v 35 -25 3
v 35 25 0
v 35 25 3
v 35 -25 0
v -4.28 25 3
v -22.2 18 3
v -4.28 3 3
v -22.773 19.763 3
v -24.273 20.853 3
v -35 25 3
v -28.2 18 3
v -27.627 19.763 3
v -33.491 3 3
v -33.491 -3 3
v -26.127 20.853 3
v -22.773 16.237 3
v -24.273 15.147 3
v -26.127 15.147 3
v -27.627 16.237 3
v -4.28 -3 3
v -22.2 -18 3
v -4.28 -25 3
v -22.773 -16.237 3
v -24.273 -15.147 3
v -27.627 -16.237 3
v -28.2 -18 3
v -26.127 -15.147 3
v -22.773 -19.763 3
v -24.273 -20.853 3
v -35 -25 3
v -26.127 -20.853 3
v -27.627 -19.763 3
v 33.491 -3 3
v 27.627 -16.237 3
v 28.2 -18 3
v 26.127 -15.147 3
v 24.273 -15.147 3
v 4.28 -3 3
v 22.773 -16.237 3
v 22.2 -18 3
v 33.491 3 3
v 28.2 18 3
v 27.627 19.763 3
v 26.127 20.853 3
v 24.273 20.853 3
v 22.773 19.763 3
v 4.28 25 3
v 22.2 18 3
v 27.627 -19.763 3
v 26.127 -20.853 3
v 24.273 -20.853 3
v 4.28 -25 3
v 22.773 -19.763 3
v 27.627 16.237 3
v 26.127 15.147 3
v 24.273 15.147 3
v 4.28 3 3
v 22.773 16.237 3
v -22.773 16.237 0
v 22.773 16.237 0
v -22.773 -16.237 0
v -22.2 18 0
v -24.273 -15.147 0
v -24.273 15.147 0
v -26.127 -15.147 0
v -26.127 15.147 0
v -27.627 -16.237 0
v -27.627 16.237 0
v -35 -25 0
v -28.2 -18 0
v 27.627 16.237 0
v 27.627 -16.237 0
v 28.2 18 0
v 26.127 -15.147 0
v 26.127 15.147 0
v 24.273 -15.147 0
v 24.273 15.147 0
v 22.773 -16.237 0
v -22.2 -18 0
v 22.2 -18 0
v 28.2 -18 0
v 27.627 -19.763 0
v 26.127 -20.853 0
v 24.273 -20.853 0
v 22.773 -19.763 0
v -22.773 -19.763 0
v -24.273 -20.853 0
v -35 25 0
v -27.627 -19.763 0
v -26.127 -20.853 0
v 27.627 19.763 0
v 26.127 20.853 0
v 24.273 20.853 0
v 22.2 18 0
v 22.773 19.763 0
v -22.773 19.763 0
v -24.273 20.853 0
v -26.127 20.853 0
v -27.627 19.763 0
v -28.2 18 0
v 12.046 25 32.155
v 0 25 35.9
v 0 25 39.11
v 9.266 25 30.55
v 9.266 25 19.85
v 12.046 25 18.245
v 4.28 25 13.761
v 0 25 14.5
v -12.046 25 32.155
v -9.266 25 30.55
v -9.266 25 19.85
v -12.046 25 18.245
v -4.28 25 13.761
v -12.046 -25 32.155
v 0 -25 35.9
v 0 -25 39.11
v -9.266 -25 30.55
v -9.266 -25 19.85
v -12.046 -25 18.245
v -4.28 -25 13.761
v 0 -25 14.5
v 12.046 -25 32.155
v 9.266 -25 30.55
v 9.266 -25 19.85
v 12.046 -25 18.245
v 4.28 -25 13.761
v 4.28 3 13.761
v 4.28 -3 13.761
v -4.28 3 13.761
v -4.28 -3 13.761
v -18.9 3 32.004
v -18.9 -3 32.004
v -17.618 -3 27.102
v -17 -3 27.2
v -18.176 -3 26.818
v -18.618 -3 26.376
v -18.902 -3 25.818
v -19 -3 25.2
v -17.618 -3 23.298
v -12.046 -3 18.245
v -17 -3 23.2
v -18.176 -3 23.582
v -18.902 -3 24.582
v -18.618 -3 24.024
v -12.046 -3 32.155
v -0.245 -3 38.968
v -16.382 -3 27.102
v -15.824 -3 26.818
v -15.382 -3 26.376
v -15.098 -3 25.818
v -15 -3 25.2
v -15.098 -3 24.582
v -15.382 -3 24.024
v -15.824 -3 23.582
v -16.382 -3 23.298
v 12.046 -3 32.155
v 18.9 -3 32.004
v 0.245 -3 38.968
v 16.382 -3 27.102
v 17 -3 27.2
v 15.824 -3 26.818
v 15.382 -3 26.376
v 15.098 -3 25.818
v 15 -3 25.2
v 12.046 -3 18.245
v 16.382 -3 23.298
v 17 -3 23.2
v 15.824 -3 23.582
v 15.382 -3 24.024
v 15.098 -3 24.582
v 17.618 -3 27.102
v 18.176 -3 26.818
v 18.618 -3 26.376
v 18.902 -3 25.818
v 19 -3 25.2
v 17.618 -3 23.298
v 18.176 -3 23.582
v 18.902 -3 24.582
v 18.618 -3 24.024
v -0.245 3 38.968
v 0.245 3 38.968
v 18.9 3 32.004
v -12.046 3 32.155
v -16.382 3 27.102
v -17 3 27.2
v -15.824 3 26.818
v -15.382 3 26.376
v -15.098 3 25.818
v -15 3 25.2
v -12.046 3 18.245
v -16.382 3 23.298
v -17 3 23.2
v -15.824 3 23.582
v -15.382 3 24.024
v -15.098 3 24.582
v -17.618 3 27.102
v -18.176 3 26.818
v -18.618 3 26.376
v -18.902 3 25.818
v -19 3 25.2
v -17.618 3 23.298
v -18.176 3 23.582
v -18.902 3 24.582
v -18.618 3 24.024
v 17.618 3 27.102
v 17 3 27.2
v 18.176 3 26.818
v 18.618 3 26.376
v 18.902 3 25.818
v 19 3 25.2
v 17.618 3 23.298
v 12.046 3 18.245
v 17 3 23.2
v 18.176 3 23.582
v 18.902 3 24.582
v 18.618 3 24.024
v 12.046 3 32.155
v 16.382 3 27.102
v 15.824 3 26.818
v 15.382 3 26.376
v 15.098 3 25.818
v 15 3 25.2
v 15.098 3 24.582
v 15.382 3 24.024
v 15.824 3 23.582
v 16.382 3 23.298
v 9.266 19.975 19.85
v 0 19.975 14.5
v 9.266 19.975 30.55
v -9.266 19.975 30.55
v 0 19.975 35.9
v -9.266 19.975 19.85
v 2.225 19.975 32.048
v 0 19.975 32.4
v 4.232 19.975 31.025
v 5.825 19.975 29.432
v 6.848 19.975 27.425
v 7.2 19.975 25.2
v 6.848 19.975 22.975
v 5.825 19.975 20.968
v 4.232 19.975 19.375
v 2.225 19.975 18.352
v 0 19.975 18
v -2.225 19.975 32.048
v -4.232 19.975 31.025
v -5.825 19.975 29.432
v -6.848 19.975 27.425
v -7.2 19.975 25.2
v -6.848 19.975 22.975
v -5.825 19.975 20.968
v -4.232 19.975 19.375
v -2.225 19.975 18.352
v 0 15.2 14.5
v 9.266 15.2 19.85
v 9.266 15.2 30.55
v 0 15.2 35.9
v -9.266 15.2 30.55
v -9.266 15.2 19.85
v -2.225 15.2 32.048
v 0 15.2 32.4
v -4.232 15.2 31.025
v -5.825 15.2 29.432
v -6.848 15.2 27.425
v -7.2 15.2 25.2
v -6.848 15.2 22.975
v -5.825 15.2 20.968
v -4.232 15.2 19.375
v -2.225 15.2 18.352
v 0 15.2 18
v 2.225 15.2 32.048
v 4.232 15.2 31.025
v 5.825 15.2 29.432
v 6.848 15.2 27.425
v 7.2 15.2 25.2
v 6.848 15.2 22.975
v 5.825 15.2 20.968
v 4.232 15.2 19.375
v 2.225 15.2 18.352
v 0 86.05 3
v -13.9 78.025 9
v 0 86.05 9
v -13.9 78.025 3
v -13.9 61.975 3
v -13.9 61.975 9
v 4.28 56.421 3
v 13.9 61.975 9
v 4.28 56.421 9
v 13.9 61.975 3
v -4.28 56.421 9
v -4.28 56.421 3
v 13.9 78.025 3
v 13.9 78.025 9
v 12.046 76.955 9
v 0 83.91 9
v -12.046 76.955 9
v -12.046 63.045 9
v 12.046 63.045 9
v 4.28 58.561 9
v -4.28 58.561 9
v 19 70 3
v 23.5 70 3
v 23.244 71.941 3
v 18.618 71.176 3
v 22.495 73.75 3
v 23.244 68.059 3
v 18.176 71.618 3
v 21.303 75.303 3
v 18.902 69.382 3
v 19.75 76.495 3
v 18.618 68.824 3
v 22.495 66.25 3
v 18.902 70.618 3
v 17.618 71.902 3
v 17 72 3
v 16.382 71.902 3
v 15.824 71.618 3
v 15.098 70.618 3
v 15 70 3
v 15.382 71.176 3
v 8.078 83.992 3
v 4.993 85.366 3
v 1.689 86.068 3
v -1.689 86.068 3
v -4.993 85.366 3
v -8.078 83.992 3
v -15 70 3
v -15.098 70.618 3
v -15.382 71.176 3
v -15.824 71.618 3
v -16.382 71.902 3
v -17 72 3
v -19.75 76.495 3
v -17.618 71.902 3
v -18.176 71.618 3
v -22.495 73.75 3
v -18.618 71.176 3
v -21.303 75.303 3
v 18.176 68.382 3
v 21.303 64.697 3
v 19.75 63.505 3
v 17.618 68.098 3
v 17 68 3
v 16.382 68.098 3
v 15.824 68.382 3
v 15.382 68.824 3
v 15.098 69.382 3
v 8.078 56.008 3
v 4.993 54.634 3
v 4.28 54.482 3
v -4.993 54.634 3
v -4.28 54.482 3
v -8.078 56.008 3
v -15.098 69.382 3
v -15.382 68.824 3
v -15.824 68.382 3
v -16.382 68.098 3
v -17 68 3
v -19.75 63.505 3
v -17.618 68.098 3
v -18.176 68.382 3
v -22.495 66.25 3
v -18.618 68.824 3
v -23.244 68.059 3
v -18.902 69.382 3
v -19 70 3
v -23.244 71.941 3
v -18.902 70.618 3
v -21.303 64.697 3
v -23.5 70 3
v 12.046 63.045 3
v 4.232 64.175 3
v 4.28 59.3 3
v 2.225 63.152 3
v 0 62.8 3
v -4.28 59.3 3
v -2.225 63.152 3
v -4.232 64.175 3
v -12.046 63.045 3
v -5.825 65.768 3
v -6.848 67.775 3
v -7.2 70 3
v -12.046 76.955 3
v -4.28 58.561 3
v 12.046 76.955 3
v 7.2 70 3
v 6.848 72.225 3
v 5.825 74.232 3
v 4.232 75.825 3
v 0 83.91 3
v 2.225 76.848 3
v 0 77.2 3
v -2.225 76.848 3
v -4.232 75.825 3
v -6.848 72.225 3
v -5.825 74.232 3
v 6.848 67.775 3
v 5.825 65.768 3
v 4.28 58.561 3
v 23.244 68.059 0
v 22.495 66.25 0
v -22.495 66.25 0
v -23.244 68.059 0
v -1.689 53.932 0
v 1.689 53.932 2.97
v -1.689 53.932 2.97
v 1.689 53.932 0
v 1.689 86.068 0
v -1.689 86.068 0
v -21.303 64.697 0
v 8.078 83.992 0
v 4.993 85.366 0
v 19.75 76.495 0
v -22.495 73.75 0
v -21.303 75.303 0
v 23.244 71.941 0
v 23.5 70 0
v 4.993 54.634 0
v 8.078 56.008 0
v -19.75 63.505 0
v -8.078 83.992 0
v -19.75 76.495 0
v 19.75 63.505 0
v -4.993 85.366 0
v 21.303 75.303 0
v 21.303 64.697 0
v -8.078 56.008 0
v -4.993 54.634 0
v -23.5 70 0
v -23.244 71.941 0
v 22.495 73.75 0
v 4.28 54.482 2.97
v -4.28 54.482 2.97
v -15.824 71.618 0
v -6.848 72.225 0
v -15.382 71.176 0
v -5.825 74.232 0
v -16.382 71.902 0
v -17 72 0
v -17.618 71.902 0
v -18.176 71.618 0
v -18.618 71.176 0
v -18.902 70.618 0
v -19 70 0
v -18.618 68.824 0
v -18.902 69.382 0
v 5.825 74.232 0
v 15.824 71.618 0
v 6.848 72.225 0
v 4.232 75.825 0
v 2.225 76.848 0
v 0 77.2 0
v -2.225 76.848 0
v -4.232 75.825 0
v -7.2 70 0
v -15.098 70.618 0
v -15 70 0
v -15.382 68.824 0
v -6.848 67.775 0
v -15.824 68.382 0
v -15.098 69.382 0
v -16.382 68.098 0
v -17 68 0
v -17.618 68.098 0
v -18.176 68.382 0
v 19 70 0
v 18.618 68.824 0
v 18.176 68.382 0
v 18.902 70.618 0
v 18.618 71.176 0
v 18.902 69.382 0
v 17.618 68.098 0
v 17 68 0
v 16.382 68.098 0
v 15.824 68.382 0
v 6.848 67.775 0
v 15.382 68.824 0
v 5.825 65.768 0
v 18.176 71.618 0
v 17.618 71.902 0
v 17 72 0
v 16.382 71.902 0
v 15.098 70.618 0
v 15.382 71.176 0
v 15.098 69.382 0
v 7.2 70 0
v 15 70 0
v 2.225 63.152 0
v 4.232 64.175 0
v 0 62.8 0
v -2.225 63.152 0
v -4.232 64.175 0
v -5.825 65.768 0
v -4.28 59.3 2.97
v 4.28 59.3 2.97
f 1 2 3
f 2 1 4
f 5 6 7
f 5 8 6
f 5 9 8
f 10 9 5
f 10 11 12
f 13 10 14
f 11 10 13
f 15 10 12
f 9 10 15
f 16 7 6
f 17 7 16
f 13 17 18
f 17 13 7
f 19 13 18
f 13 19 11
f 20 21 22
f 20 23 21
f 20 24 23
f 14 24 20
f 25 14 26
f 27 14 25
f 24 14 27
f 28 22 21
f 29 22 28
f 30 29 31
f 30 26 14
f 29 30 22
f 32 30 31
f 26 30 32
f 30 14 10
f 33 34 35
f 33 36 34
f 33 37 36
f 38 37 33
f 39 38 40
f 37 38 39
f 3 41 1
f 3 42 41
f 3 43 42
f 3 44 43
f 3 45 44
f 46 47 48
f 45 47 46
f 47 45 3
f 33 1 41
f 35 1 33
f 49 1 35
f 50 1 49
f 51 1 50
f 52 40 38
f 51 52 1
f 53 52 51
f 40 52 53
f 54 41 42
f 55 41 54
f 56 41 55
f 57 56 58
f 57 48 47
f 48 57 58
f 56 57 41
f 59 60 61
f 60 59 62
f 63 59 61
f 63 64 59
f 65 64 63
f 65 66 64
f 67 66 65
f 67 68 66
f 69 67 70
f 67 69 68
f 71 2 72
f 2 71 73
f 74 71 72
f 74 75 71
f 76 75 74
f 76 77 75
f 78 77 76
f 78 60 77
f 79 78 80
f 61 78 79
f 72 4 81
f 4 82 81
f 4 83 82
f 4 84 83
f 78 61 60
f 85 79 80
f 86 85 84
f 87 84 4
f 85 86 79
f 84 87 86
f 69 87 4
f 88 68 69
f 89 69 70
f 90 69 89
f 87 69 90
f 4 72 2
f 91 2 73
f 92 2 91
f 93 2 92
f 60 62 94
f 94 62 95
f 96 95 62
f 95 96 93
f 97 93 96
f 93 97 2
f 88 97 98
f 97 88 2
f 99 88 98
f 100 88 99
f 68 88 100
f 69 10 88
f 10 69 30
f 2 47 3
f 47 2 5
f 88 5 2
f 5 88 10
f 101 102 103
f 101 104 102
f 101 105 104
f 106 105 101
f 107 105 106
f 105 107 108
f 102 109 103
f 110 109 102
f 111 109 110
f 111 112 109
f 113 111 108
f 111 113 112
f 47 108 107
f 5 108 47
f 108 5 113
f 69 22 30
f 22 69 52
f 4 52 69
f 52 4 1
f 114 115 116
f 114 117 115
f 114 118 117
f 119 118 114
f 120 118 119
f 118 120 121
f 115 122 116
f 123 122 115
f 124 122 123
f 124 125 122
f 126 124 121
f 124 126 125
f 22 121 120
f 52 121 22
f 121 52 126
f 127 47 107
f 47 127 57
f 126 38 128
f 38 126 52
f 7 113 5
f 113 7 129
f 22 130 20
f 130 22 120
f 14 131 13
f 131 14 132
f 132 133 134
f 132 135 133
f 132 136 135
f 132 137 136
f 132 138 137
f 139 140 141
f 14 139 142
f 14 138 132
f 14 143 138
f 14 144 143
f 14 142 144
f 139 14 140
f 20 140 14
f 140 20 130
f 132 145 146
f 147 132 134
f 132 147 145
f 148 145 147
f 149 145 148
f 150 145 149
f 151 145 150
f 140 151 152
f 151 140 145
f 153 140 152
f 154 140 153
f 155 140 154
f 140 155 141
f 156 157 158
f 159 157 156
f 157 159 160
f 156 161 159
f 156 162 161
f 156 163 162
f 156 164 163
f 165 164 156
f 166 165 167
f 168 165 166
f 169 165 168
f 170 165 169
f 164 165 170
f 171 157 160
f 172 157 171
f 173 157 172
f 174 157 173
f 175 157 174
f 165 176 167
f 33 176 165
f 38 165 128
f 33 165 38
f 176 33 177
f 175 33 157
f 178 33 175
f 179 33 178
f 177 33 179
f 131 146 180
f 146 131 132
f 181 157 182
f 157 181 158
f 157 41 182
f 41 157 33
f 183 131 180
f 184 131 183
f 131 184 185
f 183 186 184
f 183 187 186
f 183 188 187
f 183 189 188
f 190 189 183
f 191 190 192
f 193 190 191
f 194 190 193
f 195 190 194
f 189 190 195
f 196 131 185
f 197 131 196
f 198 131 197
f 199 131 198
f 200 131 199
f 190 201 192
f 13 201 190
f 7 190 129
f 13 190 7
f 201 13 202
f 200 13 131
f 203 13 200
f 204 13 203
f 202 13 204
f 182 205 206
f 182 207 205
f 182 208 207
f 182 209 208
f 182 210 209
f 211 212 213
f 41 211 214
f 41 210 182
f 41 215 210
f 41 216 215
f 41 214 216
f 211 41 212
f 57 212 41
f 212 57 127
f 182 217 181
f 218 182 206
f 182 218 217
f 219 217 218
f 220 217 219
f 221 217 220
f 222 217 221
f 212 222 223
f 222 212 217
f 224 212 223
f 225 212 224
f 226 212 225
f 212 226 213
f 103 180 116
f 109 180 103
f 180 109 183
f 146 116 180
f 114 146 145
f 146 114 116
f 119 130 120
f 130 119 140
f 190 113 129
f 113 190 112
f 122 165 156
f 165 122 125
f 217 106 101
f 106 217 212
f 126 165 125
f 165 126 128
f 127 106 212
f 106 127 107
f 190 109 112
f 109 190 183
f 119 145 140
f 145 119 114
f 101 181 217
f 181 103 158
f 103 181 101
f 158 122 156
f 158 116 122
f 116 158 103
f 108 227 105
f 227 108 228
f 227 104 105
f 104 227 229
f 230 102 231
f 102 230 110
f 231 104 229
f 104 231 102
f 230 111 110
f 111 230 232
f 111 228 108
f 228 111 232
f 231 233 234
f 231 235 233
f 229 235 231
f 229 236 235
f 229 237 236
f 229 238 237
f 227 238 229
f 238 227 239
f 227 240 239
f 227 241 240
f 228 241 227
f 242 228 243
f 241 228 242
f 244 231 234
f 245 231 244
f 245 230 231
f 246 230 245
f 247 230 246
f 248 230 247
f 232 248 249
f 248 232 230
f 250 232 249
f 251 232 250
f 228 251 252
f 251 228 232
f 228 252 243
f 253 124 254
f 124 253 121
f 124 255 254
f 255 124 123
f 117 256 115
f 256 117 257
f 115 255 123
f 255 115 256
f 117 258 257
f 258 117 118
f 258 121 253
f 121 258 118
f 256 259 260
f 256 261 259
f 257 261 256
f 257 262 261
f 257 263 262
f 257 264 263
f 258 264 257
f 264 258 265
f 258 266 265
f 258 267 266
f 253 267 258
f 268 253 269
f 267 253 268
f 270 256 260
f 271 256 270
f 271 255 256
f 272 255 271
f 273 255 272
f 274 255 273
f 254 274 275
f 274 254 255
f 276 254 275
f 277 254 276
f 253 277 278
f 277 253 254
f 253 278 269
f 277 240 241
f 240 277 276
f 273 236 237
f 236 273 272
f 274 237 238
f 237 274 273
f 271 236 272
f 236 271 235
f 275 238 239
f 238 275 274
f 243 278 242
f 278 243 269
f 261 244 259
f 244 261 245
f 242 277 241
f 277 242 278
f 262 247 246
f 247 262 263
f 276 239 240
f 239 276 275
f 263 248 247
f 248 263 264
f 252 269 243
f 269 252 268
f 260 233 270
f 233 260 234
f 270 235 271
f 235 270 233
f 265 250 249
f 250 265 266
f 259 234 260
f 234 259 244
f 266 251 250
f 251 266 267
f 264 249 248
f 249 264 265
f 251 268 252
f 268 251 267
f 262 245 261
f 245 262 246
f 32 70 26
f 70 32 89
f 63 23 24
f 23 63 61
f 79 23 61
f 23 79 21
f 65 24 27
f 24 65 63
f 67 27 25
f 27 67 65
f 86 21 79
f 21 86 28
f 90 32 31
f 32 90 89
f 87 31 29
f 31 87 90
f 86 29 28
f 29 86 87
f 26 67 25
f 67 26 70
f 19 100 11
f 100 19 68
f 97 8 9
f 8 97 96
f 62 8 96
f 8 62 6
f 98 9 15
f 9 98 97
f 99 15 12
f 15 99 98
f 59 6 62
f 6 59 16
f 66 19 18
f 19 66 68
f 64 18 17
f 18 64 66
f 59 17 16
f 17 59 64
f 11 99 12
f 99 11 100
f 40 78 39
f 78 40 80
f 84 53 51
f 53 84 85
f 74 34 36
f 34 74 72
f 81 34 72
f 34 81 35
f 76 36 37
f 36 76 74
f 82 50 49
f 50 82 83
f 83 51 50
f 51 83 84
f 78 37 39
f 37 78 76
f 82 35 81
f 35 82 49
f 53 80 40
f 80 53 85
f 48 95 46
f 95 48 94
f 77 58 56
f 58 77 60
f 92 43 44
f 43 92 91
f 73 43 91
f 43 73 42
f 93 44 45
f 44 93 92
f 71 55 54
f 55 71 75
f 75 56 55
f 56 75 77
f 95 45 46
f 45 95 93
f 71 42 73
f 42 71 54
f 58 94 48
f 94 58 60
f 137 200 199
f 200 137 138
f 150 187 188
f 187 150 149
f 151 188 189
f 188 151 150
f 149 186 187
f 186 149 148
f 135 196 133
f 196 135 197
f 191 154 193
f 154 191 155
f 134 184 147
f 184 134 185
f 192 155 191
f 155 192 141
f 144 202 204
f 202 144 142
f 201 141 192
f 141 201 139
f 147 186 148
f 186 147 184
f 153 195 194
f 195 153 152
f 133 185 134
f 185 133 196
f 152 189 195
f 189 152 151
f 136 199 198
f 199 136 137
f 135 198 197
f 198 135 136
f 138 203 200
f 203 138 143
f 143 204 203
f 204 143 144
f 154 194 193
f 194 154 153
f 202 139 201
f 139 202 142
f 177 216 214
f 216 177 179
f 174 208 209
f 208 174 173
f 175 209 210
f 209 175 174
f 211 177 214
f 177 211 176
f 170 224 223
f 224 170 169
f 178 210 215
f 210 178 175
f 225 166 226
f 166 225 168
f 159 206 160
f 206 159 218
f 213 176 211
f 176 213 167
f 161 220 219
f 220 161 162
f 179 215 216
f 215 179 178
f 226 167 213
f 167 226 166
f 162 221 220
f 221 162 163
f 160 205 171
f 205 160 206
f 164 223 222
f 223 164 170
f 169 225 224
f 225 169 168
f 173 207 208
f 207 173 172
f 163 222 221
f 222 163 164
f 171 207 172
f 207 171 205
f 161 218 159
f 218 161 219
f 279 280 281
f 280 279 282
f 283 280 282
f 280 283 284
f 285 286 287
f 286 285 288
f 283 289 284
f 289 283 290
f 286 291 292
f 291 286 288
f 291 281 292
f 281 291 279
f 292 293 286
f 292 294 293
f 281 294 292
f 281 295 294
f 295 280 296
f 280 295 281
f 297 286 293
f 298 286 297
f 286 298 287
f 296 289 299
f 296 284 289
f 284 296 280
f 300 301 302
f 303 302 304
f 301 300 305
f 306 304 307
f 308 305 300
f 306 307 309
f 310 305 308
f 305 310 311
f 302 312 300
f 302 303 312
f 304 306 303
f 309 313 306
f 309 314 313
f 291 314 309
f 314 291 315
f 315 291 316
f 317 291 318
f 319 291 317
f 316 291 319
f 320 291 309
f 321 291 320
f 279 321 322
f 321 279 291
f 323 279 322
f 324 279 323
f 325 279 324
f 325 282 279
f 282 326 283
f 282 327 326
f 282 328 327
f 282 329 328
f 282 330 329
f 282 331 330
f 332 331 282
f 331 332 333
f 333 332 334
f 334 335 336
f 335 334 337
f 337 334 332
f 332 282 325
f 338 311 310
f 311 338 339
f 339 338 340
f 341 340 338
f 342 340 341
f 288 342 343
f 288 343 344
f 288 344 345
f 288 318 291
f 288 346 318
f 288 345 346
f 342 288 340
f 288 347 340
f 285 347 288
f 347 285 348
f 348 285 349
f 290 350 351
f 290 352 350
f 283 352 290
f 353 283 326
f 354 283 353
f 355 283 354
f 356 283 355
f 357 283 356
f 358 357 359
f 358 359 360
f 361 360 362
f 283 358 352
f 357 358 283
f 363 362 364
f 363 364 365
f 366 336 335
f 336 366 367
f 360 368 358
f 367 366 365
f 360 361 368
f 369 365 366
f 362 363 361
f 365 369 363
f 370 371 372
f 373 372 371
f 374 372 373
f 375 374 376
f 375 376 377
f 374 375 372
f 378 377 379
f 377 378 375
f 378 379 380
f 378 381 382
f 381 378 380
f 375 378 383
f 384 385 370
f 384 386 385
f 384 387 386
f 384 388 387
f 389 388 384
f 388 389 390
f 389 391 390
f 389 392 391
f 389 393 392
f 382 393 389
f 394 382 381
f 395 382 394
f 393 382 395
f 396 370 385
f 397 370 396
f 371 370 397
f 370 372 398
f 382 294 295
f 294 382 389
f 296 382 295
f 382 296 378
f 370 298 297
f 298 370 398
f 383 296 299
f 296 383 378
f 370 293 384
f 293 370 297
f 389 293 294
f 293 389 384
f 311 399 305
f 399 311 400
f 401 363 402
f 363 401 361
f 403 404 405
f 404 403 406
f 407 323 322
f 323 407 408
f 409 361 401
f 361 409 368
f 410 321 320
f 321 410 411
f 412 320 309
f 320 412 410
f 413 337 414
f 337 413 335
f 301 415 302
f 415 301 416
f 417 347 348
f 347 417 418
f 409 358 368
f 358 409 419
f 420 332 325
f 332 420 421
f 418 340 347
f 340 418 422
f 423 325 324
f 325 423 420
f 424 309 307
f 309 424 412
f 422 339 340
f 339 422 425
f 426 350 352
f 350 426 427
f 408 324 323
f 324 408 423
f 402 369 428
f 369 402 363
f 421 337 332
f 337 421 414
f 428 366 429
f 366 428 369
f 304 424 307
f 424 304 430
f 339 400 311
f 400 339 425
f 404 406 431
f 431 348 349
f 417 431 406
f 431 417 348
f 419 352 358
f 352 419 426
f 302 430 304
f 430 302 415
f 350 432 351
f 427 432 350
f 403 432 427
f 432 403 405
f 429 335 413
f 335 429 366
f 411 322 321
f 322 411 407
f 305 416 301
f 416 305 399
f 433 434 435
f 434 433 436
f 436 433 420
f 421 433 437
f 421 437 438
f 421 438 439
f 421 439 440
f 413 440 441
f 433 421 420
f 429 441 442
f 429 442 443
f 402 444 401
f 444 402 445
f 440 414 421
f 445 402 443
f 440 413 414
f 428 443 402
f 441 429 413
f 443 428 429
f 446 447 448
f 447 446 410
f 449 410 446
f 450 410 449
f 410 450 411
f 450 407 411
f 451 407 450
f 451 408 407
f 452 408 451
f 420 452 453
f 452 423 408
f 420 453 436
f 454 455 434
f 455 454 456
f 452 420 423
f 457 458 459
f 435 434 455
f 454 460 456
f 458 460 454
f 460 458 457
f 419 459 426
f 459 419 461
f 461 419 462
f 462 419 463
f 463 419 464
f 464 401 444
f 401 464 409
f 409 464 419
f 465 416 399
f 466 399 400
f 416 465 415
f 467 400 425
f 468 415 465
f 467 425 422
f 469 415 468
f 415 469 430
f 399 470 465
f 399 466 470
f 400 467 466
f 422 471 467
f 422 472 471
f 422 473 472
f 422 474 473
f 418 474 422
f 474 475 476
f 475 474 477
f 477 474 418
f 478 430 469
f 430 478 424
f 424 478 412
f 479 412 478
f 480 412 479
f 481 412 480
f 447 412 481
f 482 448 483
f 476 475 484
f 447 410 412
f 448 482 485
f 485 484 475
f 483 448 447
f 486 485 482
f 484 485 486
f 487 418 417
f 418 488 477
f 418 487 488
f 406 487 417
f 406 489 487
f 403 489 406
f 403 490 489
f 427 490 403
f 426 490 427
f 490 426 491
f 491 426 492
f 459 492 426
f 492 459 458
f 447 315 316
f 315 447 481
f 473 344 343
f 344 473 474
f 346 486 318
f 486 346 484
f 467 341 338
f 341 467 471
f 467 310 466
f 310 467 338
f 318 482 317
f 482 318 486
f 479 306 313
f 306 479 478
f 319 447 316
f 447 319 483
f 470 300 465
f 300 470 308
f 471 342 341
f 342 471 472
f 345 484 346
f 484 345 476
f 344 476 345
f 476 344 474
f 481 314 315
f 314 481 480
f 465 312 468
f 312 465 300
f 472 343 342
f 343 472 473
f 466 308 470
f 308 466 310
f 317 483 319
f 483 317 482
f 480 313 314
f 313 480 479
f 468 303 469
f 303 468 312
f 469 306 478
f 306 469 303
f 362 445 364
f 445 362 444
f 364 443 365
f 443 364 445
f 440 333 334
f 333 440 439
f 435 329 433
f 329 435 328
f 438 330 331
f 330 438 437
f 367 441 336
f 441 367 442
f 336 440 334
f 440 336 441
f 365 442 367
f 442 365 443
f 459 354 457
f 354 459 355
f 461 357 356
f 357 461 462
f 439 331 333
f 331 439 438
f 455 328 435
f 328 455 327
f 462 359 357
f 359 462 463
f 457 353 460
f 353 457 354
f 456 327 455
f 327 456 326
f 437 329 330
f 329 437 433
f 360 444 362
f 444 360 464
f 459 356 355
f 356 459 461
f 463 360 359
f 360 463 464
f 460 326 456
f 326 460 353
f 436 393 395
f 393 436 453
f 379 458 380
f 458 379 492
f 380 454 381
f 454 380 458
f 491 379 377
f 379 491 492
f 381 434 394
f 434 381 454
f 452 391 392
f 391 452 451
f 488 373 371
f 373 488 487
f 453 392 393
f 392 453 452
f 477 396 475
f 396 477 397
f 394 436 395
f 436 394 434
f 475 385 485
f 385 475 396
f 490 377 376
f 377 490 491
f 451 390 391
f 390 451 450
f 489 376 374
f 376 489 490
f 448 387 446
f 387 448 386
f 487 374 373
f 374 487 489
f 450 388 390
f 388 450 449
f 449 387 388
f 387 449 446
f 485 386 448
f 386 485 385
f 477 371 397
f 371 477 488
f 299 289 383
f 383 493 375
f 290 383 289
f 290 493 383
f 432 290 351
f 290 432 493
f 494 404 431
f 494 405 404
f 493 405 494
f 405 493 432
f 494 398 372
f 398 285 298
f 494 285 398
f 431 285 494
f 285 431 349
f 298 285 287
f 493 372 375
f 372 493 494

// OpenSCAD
// pieza cnc para unir eje Y con la varilla roscada anti-backslash

dcilindro = 12;  // radio varilla de 12
dtuerca = 21.4;  // radio de una tuerca de 12
ytuerca1 = 5;   // largo zona tuerca 1  <<< esto es medida 1 tuerca, un poco menos
ycilindro = 5;   // largo zona cilindro  <<< esto es que haya un minimo de material de tope
ytuerca2 = 40;   // largo zona tuerca 2  <<< esto es medida 1 tuerca + resorte con la compresion que se quiera

xtotal = 70;   // ancho pieza
ytotal = ytuerca1 + ycilindro + ytuerca2; // largo pieza
ydescentre = (ytuerca2 - ytuerca1)/2; // offset largo
zbase = 3;  // alto base pieza

zvarilla = 25.2; // separacion del centro de la varilla al suelo

xpegote = dtuerca * 0.4;  // ancho del cube que pega el elemento con la base cilindro
zpegote = zvarilla;

dagujeros = 6;   // diametro agujeros en el suelo
dagujeros2 = 4;   // diametro agujeros para la arandela de presion
fagujeros = 0.14; // factor de pegado al borde de los agujeros (entre 0-0.25)

module elemento_solido() {
    hull() {
        rotate([0, 0, 360/12])
            translate([0, 0, ydescentre])
                cylinder(d=dtuerca*1.3, h=ytotal, $fn=6, center=true);
    }
}

module elemento_agujero() {
    cylinder(d=dcilindro*1.2, h=ycilindro, $fn=20, center=true);
    rotate([0, 0, 360/12]) {
        translate([0, 0, -ytuerca1/2-ycilindro/2]) 
            cylinder(d=dtuerca, h=ytuerca1*1.01, $fn=6, center=true);
        translate([0, 0, ytuerca2/2+ycilindro/2]) 
            cylinder(d=dtuerca, h=ytuerca2*1.01, $fn=6, center=true);
    }
}

module pieza1 () {
    translate([0, ydescentre, 0]) 
        difference() {
            union() {
                translate([0, -ydescentre, 0]) {
                    // la base plana
                    translate([0, 0, zbase/2]) 
                        cube([xtotal, ytotal, zbase], center=true);
                    // el pegote
                    translate([0, 0, zpegote/2]) 
                        cube([xpegote, ytotal, zpegote], center=true);
                    // el triangulo
                    rotate([90, 0, 0])
                        linear_extrude(zbase*2, center=true) 
                            polygon([[-xtotal/2, 0], [-xtotal*0.27, zvarilla*1.27], [0, zvarilla*1.55], [xtotal*0.27, zvarilla*1.27], [xtotal/2, 0]]);
                }
                // el elemento
                translate([0, 0, zvarilla])
                    rotate([90, 0, 0]) 
                        elemento_solido();
            }
            // el agujero del elemento
            translate([0, 0, zvarilla])
                rotate([90, 0, 0]) 
                    elemento_agujero();
            // los agujeros en la base
            for (x=[fagujeros, 1-fagujeros])
                for (y=[fagujeros, 1-fagujeros]) 
                    translate([(x-0.5)*xtotal, (y-0.5)*ytotal-ydescentre, zbase/2]) 
                        cylinder(d=dagujeros, h=zbase*1.01, center=true);
            for (x=[-17, 17])
                translate([x, -ydescentre, zvarilla])
                    rotate([90, 0, 0])
                        cylinder(d=dagujeros2, h=2*zbase*1.01, center=true, $fn=20);
                
        }
}

module pieza2(h1=zbase, h2=2*zbase) {
    translate([0, 0, h1/2])
        difference() {
            union() {
                rotate([0, 0, 360/12])
                    translate([0, 0, h1/2+h2/2])
                        difference() {
                            cylinder(d=dtuerca*1.5, h=h2, $fn=6, center=true);
                            cylinder(d=dtuerca*1.3, h=h2*1.01, $fn=6, center=true);
                        }
                hull() {
                    translate([-16, 0, 0]) cylinder(d=15, h=h1, center=true);
                    translate([+16, 0, 0]) cylinder(d=15, h=h1, center=true);
                    translate([0, 0, 0]) cylinder(d=dtuerca*1.51, h=h1, center=true);
                }
            }
            
            cylinder(d=dcilindro*1.2, h=h1*1.01, $fn=20, center=true);
            for (x=[-17, 17])
                translate([x, 0, 0])
                    cylinder(d=dagujeros2, h=h1*1.01, center=true, $fn=20);
            translate([0, dtuerca*0.7, h1/2+h2/2])
                cube([xpegote, xpegote, h2*1.01], center=true);
        }
}

pieza1();
translate([0, 70, 0]) 
    rotate([0, 0, 180]) 
        pieza2();

/*
%translate([0, 70, zvarilla]) 
    rotate([90, 180, 0]) 
        pieza2();
*/
